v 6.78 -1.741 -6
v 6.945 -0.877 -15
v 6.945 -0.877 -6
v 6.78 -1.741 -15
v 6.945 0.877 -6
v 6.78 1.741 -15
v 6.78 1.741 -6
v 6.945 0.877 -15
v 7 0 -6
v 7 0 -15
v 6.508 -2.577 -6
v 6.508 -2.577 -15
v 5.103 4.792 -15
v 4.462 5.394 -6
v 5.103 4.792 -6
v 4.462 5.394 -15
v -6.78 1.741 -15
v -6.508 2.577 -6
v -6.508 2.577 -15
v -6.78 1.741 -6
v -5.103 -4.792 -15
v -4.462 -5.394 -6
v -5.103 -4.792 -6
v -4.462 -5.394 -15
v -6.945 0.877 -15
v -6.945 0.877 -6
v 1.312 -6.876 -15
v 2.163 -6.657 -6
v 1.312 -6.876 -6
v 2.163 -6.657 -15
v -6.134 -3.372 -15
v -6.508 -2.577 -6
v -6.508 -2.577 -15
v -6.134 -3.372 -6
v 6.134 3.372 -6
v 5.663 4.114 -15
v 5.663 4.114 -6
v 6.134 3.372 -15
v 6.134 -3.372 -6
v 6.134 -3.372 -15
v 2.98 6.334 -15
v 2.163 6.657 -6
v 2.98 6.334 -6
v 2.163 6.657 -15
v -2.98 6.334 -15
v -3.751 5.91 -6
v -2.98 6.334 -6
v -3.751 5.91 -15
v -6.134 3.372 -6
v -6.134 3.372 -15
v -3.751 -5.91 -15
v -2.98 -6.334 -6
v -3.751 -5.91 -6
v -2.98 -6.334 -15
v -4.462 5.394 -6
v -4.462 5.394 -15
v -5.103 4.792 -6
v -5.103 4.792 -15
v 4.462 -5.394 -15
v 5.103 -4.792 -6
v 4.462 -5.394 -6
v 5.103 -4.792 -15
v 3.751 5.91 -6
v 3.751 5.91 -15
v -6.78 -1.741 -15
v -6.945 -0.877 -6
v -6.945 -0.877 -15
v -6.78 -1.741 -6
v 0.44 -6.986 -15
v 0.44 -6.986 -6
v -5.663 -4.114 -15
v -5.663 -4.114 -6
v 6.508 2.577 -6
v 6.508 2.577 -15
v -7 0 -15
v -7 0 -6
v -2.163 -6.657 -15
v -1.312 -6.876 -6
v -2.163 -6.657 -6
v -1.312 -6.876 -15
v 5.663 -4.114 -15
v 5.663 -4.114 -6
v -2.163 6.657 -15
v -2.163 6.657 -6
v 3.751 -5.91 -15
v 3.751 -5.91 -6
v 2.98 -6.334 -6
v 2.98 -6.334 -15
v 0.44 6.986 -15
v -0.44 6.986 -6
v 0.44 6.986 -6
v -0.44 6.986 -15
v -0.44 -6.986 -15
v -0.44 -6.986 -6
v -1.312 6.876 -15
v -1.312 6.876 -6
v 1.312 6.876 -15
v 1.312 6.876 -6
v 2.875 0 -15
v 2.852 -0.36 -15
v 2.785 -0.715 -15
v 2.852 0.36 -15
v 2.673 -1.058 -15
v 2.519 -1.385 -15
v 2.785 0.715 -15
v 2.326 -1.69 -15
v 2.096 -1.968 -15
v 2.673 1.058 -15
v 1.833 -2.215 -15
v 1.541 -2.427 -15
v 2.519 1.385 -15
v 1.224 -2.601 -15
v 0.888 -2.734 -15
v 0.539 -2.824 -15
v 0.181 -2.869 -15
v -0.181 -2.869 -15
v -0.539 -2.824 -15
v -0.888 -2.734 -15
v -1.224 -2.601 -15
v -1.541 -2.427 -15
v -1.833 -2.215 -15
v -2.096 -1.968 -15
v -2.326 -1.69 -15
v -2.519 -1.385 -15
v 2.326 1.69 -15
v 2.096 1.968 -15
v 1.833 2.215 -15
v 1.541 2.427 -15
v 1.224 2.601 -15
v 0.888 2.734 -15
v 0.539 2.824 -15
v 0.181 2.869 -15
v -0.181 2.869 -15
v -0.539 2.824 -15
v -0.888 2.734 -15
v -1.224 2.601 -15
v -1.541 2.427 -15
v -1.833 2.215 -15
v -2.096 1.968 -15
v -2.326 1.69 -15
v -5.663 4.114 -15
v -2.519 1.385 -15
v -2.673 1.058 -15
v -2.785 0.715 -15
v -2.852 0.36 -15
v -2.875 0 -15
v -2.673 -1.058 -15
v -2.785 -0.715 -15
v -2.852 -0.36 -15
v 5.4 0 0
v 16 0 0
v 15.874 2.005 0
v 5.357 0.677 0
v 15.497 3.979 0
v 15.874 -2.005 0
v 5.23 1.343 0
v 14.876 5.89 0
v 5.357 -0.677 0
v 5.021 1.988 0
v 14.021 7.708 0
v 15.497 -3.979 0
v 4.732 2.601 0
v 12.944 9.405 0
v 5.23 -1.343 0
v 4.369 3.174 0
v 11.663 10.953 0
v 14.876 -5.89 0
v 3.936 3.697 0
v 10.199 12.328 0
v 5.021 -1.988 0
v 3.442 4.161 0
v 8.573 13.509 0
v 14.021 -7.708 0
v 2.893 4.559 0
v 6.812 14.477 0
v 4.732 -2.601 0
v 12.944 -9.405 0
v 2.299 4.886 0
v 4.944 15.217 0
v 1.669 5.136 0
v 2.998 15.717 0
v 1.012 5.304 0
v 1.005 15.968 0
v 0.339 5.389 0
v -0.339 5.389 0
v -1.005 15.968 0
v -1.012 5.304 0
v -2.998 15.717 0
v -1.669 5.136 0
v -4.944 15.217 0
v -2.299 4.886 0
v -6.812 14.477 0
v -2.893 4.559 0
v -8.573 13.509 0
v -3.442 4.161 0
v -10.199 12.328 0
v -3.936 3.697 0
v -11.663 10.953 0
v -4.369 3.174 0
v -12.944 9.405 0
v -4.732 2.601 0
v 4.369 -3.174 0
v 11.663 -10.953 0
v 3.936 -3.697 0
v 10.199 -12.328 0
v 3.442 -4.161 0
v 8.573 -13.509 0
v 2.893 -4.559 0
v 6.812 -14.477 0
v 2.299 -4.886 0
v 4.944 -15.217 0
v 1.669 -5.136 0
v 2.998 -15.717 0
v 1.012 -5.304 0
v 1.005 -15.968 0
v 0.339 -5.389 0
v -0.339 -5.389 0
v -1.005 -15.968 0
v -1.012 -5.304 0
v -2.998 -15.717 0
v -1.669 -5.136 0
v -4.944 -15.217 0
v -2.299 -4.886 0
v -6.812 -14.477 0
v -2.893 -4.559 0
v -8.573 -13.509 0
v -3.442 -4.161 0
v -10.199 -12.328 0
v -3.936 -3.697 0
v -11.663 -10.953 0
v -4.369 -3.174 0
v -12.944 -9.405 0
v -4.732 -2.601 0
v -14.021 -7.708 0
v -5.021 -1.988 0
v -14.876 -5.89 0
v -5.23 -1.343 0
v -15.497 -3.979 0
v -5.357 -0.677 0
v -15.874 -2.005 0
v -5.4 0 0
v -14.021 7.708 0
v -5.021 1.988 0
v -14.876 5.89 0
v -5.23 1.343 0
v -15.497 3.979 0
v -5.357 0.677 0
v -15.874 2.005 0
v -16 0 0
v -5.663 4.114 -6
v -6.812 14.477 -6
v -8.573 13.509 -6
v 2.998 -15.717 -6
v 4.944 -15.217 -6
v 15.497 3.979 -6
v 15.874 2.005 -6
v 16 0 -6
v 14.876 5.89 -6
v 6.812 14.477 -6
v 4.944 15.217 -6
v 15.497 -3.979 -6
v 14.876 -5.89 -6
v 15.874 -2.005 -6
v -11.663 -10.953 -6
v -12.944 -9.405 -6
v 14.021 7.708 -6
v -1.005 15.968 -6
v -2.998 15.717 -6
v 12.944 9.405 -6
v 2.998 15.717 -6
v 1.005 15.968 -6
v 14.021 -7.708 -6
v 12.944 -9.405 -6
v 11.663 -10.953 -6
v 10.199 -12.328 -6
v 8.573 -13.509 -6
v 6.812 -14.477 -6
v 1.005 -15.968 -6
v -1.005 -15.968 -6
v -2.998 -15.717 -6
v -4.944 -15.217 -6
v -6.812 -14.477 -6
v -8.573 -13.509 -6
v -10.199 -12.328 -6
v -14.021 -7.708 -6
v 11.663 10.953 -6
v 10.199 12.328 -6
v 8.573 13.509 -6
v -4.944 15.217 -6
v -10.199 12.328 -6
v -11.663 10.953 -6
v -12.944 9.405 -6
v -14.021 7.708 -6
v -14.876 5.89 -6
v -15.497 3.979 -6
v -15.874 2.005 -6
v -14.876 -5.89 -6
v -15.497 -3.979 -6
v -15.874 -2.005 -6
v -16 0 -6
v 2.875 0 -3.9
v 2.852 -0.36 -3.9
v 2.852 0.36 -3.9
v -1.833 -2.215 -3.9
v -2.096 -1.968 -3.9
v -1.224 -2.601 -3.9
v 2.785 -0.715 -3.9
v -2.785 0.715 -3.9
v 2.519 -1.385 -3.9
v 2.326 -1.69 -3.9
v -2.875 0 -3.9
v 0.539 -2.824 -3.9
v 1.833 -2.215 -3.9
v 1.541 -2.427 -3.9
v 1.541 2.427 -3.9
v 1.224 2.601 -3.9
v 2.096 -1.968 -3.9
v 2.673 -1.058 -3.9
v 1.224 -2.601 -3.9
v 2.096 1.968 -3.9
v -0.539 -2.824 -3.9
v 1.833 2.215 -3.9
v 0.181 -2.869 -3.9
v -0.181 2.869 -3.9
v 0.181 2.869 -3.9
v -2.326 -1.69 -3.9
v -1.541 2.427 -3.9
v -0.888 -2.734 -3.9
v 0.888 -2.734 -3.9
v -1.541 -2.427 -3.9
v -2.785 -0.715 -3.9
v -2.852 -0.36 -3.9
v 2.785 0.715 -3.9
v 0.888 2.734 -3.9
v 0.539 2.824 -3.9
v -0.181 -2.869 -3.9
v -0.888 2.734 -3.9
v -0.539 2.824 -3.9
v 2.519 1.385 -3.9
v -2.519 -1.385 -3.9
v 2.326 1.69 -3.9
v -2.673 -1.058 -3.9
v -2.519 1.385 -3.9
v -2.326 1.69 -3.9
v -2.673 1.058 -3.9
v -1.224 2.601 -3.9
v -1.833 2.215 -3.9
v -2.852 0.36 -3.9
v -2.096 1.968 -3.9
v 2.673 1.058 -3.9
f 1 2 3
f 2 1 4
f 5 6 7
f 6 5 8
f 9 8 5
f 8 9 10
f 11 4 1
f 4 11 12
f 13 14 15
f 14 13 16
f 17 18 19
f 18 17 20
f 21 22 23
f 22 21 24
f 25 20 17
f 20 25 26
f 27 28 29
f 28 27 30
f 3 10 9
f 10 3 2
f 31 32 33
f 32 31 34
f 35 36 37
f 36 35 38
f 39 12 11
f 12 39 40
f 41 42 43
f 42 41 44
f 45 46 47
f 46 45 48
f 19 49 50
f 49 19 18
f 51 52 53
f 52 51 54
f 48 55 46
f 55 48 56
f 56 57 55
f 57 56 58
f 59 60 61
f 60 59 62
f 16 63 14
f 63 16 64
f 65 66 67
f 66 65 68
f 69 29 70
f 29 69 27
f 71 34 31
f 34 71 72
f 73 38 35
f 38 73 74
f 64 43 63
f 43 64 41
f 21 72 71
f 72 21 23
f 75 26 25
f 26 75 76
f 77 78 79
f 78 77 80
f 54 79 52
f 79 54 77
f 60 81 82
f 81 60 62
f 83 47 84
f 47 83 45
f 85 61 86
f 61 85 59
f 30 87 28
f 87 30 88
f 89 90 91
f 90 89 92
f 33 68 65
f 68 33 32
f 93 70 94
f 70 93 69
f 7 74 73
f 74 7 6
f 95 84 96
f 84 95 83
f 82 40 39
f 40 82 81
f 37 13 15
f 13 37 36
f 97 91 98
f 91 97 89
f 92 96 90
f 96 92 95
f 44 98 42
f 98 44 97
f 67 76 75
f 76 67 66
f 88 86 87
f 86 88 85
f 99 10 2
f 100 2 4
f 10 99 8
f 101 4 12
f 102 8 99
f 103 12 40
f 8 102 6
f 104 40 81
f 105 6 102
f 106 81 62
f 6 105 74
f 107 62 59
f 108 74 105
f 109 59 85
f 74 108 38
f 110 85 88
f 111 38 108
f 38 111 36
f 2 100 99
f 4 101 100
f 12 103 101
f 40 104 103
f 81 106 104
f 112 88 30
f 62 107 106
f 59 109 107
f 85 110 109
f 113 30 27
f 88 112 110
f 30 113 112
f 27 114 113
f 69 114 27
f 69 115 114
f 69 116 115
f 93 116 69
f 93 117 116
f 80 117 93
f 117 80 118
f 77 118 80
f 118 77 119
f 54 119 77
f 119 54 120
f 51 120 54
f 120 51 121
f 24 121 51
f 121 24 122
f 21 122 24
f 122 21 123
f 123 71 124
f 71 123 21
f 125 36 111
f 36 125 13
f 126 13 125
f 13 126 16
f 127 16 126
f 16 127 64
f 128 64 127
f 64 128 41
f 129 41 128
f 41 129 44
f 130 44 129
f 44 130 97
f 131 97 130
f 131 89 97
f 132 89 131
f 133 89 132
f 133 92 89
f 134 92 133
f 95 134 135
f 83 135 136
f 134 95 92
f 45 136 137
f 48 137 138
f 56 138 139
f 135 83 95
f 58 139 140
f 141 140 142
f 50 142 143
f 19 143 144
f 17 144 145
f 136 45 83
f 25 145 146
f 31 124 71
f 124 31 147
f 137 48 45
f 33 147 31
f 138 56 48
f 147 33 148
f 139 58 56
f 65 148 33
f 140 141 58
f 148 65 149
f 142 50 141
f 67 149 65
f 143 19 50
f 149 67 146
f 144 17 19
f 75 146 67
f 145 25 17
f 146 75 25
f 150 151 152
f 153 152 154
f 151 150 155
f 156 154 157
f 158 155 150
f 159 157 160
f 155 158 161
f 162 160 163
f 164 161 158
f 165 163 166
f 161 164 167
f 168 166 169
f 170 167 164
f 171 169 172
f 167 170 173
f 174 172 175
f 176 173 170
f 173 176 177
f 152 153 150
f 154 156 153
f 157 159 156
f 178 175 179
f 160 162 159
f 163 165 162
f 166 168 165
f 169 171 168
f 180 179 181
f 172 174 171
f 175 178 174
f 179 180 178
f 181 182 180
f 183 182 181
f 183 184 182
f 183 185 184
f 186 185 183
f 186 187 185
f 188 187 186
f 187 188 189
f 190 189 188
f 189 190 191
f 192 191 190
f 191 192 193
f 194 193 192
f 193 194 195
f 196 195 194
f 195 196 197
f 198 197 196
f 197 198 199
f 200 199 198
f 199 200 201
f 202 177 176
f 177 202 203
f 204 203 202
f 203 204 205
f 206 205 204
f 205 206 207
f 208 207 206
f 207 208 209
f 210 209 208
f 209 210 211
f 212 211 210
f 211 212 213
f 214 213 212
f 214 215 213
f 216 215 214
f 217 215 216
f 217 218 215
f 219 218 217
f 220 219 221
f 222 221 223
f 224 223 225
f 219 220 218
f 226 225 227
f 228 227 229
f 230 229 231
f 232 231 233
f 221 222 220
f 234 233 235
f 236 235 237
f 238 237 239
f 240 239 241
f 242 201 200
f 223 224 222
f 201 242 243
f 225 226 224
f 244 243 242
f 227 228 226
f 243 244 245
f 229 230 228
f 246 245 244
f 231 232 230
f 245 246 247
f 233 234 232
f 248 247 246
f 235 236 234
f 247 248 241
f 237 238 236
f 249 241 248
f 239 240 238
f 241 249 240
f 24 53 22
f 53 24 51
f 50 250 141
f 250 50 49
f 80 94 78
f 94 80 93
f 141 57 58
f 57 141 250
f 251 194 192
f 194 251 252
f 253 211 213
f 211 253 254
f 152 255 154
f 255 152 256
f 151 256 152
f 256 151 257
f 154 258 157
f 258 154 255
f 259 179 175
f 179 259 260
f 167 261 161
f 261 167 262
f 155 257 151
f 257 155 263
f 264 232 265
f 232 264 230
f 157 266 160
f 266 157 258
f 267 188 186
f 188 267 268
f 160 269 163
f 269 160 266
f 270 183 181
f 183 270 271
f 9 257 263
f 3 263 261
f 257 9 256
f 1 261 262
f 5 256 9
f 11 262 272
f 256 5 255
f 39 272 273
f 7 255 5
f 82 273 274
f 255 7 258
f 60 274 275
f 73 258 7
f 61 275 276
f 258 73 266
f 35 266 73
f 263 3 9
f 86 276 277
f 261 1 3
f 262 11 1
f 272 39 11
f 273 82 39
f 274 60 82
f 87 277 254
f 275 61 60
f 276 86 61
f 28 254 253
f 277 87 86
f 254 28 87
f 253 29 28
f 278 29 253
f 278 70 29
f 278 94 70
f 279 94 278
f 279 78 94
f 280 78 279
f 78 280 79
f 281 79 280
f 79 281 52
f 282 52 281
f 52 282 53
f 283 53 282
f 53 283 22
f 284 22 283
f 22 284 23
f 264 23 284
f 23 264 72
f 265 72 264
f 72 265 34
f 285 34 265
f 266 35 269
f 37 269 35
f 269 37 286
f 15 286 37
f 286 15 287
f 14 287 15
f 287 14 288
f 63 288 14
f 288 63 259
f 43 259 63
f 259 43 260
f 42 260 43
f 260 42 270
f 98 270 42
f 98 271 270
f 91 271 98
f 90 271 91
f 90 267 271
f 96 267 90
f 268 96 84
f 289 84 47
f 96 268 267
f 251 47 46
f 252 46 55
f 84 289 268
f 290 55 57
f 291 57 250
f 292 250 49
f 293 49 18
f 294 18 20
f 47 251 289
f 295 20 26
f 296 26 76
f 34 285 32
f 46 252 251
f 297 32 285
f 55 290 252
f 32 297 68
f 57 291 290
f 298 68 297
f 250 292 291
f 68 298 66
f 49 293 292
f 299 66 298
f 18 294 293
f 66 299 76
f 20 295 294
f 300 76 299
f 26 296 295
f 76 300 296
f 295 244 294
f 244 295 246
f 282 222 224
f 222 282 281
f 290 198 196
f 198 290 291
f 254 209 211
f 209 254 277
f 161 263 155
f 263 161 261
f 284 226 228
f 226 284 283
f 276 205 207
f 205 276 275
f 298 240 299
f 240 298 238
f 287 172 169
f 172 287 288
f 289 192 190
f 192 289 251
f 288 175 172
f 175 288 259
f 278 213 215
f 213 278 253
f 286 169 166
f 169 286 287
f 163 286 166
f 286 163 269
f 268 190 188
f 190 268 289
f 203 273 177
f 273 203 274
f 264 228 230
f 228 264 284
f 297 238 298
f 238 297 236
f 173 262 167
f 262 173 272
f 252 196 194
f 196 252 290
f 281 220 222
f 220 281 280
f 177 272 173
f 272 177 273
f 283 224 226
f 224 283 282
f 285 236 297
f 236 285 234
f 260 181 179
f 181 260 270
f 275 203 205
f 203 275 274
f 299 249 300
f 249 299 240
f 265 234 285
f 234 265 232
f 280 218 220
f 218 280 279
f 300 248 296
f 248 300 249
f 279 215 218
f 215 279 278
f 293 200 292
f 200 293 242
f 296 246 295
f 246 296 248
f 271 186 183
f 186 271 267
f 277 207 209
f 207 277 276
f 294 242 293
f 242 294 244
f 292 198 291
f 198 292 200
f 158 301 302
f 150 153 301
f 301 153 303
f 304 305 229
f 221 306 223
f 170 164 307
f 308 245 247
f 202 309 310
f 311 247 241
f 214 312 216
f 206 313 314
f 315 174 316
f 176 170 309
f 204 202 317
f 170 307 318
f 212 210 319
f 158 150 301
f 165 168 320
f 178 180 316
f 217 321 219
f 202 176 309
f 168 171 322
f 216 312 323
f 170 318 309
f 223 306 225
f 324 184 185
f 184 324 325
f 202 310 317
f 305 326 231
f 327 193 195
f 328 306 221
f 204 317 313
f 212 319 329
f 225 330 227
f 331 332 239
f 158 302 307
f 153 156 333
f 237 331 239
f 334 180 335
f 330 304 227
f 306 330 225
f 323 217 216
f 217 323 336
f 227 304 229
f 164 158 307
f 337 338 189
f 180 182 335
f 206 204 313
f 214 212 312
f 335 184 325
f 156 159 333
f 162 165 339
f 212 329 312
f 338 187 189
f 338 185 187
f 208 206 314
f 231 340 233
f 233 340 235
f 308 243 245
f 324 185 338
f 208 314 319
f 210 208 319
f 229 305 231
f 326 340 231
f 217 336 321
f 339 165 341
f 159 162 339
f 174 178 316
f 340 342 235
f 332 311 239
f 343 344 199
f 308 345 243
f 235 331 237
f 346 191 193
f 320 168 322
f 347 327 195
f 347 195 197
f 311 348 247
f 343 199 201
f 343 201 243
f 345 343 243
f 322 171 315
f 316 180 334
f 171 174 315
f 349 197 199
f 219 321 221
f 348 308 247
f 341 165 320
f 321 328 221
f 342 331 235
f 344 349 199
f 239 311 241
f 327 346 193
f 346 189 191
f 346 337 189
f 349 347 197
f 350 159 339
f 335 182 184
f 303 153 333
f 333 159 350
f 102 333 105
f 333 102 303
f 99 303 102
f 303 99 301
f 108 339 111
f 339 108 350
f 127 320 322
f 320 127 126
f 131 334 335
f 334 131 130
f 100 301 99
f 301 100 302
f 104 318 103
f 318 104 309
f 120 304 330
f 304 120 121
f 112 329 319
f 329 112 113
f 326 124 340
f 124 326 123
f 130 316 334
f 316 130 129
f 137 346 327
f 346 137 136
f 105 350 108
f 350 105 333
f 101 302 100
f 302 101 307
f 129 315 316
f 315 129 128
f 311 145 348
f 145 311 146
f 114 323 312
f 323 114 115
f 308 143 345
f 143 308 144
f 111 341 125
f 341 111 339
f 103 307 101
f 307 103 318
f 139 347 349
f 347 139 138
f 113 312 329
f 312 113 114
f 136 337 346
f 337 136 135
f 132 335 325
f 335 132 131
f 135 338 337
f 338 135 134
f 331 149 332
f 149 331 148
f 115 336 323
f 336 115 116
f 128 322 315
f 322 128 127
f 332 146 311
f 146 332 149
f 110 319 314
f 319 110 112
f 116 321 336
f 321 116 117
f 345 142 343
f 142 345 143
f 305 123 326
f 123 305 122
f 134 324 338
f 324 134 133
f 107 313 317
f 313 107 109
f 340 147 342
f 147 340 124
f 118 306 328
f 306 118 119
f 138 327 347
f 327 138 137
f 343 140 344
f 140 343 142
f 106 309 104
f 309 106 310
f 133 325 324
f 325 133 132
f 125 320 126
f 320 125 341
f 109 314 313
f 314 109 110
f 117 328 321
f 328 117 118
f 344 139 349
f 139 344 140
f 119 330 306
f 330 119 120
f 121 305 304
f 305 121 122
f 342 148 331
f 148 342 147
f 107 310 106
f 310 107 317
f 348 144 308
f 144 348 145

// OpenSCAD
$fn = 50;


difference() {
	union() {
		translate(v = [0, 0, -15.0000000000]) {
			cylinder(h = 15, r = 7.0000000000);
		}
		translate(v = [0, 0, -6.0000000000]) {
			cylinder(h = 6, r = 16.0000000000);
		}
	}
	union() {
		translate(v = [0, 0, 0]) {
			rotate(a = [0, 0, 0]) {
				difference() {
					union() {
						#translate(v = [0, 0, -15.0000000000]) {
							cylinder(h = 15, r = 2.6000000000);
						}
						#translate(v = [0, 0, -3.9000000000]) {
							cylinder(h = 3.9000000000, r1 = 2.8750000000, r2 = 5.4000000000);
						}
						#translate(v = [0, 0, -15.0000000000]) {
							cylinder(h = 15, r = 2.8750000000);
						}
						#translate(v = [0, 0, -15.0000000000]) {
							cylinder(h = 15, r = 2.6000000000);
						}
					}
					union();
				}
			}
		}
	}
}
